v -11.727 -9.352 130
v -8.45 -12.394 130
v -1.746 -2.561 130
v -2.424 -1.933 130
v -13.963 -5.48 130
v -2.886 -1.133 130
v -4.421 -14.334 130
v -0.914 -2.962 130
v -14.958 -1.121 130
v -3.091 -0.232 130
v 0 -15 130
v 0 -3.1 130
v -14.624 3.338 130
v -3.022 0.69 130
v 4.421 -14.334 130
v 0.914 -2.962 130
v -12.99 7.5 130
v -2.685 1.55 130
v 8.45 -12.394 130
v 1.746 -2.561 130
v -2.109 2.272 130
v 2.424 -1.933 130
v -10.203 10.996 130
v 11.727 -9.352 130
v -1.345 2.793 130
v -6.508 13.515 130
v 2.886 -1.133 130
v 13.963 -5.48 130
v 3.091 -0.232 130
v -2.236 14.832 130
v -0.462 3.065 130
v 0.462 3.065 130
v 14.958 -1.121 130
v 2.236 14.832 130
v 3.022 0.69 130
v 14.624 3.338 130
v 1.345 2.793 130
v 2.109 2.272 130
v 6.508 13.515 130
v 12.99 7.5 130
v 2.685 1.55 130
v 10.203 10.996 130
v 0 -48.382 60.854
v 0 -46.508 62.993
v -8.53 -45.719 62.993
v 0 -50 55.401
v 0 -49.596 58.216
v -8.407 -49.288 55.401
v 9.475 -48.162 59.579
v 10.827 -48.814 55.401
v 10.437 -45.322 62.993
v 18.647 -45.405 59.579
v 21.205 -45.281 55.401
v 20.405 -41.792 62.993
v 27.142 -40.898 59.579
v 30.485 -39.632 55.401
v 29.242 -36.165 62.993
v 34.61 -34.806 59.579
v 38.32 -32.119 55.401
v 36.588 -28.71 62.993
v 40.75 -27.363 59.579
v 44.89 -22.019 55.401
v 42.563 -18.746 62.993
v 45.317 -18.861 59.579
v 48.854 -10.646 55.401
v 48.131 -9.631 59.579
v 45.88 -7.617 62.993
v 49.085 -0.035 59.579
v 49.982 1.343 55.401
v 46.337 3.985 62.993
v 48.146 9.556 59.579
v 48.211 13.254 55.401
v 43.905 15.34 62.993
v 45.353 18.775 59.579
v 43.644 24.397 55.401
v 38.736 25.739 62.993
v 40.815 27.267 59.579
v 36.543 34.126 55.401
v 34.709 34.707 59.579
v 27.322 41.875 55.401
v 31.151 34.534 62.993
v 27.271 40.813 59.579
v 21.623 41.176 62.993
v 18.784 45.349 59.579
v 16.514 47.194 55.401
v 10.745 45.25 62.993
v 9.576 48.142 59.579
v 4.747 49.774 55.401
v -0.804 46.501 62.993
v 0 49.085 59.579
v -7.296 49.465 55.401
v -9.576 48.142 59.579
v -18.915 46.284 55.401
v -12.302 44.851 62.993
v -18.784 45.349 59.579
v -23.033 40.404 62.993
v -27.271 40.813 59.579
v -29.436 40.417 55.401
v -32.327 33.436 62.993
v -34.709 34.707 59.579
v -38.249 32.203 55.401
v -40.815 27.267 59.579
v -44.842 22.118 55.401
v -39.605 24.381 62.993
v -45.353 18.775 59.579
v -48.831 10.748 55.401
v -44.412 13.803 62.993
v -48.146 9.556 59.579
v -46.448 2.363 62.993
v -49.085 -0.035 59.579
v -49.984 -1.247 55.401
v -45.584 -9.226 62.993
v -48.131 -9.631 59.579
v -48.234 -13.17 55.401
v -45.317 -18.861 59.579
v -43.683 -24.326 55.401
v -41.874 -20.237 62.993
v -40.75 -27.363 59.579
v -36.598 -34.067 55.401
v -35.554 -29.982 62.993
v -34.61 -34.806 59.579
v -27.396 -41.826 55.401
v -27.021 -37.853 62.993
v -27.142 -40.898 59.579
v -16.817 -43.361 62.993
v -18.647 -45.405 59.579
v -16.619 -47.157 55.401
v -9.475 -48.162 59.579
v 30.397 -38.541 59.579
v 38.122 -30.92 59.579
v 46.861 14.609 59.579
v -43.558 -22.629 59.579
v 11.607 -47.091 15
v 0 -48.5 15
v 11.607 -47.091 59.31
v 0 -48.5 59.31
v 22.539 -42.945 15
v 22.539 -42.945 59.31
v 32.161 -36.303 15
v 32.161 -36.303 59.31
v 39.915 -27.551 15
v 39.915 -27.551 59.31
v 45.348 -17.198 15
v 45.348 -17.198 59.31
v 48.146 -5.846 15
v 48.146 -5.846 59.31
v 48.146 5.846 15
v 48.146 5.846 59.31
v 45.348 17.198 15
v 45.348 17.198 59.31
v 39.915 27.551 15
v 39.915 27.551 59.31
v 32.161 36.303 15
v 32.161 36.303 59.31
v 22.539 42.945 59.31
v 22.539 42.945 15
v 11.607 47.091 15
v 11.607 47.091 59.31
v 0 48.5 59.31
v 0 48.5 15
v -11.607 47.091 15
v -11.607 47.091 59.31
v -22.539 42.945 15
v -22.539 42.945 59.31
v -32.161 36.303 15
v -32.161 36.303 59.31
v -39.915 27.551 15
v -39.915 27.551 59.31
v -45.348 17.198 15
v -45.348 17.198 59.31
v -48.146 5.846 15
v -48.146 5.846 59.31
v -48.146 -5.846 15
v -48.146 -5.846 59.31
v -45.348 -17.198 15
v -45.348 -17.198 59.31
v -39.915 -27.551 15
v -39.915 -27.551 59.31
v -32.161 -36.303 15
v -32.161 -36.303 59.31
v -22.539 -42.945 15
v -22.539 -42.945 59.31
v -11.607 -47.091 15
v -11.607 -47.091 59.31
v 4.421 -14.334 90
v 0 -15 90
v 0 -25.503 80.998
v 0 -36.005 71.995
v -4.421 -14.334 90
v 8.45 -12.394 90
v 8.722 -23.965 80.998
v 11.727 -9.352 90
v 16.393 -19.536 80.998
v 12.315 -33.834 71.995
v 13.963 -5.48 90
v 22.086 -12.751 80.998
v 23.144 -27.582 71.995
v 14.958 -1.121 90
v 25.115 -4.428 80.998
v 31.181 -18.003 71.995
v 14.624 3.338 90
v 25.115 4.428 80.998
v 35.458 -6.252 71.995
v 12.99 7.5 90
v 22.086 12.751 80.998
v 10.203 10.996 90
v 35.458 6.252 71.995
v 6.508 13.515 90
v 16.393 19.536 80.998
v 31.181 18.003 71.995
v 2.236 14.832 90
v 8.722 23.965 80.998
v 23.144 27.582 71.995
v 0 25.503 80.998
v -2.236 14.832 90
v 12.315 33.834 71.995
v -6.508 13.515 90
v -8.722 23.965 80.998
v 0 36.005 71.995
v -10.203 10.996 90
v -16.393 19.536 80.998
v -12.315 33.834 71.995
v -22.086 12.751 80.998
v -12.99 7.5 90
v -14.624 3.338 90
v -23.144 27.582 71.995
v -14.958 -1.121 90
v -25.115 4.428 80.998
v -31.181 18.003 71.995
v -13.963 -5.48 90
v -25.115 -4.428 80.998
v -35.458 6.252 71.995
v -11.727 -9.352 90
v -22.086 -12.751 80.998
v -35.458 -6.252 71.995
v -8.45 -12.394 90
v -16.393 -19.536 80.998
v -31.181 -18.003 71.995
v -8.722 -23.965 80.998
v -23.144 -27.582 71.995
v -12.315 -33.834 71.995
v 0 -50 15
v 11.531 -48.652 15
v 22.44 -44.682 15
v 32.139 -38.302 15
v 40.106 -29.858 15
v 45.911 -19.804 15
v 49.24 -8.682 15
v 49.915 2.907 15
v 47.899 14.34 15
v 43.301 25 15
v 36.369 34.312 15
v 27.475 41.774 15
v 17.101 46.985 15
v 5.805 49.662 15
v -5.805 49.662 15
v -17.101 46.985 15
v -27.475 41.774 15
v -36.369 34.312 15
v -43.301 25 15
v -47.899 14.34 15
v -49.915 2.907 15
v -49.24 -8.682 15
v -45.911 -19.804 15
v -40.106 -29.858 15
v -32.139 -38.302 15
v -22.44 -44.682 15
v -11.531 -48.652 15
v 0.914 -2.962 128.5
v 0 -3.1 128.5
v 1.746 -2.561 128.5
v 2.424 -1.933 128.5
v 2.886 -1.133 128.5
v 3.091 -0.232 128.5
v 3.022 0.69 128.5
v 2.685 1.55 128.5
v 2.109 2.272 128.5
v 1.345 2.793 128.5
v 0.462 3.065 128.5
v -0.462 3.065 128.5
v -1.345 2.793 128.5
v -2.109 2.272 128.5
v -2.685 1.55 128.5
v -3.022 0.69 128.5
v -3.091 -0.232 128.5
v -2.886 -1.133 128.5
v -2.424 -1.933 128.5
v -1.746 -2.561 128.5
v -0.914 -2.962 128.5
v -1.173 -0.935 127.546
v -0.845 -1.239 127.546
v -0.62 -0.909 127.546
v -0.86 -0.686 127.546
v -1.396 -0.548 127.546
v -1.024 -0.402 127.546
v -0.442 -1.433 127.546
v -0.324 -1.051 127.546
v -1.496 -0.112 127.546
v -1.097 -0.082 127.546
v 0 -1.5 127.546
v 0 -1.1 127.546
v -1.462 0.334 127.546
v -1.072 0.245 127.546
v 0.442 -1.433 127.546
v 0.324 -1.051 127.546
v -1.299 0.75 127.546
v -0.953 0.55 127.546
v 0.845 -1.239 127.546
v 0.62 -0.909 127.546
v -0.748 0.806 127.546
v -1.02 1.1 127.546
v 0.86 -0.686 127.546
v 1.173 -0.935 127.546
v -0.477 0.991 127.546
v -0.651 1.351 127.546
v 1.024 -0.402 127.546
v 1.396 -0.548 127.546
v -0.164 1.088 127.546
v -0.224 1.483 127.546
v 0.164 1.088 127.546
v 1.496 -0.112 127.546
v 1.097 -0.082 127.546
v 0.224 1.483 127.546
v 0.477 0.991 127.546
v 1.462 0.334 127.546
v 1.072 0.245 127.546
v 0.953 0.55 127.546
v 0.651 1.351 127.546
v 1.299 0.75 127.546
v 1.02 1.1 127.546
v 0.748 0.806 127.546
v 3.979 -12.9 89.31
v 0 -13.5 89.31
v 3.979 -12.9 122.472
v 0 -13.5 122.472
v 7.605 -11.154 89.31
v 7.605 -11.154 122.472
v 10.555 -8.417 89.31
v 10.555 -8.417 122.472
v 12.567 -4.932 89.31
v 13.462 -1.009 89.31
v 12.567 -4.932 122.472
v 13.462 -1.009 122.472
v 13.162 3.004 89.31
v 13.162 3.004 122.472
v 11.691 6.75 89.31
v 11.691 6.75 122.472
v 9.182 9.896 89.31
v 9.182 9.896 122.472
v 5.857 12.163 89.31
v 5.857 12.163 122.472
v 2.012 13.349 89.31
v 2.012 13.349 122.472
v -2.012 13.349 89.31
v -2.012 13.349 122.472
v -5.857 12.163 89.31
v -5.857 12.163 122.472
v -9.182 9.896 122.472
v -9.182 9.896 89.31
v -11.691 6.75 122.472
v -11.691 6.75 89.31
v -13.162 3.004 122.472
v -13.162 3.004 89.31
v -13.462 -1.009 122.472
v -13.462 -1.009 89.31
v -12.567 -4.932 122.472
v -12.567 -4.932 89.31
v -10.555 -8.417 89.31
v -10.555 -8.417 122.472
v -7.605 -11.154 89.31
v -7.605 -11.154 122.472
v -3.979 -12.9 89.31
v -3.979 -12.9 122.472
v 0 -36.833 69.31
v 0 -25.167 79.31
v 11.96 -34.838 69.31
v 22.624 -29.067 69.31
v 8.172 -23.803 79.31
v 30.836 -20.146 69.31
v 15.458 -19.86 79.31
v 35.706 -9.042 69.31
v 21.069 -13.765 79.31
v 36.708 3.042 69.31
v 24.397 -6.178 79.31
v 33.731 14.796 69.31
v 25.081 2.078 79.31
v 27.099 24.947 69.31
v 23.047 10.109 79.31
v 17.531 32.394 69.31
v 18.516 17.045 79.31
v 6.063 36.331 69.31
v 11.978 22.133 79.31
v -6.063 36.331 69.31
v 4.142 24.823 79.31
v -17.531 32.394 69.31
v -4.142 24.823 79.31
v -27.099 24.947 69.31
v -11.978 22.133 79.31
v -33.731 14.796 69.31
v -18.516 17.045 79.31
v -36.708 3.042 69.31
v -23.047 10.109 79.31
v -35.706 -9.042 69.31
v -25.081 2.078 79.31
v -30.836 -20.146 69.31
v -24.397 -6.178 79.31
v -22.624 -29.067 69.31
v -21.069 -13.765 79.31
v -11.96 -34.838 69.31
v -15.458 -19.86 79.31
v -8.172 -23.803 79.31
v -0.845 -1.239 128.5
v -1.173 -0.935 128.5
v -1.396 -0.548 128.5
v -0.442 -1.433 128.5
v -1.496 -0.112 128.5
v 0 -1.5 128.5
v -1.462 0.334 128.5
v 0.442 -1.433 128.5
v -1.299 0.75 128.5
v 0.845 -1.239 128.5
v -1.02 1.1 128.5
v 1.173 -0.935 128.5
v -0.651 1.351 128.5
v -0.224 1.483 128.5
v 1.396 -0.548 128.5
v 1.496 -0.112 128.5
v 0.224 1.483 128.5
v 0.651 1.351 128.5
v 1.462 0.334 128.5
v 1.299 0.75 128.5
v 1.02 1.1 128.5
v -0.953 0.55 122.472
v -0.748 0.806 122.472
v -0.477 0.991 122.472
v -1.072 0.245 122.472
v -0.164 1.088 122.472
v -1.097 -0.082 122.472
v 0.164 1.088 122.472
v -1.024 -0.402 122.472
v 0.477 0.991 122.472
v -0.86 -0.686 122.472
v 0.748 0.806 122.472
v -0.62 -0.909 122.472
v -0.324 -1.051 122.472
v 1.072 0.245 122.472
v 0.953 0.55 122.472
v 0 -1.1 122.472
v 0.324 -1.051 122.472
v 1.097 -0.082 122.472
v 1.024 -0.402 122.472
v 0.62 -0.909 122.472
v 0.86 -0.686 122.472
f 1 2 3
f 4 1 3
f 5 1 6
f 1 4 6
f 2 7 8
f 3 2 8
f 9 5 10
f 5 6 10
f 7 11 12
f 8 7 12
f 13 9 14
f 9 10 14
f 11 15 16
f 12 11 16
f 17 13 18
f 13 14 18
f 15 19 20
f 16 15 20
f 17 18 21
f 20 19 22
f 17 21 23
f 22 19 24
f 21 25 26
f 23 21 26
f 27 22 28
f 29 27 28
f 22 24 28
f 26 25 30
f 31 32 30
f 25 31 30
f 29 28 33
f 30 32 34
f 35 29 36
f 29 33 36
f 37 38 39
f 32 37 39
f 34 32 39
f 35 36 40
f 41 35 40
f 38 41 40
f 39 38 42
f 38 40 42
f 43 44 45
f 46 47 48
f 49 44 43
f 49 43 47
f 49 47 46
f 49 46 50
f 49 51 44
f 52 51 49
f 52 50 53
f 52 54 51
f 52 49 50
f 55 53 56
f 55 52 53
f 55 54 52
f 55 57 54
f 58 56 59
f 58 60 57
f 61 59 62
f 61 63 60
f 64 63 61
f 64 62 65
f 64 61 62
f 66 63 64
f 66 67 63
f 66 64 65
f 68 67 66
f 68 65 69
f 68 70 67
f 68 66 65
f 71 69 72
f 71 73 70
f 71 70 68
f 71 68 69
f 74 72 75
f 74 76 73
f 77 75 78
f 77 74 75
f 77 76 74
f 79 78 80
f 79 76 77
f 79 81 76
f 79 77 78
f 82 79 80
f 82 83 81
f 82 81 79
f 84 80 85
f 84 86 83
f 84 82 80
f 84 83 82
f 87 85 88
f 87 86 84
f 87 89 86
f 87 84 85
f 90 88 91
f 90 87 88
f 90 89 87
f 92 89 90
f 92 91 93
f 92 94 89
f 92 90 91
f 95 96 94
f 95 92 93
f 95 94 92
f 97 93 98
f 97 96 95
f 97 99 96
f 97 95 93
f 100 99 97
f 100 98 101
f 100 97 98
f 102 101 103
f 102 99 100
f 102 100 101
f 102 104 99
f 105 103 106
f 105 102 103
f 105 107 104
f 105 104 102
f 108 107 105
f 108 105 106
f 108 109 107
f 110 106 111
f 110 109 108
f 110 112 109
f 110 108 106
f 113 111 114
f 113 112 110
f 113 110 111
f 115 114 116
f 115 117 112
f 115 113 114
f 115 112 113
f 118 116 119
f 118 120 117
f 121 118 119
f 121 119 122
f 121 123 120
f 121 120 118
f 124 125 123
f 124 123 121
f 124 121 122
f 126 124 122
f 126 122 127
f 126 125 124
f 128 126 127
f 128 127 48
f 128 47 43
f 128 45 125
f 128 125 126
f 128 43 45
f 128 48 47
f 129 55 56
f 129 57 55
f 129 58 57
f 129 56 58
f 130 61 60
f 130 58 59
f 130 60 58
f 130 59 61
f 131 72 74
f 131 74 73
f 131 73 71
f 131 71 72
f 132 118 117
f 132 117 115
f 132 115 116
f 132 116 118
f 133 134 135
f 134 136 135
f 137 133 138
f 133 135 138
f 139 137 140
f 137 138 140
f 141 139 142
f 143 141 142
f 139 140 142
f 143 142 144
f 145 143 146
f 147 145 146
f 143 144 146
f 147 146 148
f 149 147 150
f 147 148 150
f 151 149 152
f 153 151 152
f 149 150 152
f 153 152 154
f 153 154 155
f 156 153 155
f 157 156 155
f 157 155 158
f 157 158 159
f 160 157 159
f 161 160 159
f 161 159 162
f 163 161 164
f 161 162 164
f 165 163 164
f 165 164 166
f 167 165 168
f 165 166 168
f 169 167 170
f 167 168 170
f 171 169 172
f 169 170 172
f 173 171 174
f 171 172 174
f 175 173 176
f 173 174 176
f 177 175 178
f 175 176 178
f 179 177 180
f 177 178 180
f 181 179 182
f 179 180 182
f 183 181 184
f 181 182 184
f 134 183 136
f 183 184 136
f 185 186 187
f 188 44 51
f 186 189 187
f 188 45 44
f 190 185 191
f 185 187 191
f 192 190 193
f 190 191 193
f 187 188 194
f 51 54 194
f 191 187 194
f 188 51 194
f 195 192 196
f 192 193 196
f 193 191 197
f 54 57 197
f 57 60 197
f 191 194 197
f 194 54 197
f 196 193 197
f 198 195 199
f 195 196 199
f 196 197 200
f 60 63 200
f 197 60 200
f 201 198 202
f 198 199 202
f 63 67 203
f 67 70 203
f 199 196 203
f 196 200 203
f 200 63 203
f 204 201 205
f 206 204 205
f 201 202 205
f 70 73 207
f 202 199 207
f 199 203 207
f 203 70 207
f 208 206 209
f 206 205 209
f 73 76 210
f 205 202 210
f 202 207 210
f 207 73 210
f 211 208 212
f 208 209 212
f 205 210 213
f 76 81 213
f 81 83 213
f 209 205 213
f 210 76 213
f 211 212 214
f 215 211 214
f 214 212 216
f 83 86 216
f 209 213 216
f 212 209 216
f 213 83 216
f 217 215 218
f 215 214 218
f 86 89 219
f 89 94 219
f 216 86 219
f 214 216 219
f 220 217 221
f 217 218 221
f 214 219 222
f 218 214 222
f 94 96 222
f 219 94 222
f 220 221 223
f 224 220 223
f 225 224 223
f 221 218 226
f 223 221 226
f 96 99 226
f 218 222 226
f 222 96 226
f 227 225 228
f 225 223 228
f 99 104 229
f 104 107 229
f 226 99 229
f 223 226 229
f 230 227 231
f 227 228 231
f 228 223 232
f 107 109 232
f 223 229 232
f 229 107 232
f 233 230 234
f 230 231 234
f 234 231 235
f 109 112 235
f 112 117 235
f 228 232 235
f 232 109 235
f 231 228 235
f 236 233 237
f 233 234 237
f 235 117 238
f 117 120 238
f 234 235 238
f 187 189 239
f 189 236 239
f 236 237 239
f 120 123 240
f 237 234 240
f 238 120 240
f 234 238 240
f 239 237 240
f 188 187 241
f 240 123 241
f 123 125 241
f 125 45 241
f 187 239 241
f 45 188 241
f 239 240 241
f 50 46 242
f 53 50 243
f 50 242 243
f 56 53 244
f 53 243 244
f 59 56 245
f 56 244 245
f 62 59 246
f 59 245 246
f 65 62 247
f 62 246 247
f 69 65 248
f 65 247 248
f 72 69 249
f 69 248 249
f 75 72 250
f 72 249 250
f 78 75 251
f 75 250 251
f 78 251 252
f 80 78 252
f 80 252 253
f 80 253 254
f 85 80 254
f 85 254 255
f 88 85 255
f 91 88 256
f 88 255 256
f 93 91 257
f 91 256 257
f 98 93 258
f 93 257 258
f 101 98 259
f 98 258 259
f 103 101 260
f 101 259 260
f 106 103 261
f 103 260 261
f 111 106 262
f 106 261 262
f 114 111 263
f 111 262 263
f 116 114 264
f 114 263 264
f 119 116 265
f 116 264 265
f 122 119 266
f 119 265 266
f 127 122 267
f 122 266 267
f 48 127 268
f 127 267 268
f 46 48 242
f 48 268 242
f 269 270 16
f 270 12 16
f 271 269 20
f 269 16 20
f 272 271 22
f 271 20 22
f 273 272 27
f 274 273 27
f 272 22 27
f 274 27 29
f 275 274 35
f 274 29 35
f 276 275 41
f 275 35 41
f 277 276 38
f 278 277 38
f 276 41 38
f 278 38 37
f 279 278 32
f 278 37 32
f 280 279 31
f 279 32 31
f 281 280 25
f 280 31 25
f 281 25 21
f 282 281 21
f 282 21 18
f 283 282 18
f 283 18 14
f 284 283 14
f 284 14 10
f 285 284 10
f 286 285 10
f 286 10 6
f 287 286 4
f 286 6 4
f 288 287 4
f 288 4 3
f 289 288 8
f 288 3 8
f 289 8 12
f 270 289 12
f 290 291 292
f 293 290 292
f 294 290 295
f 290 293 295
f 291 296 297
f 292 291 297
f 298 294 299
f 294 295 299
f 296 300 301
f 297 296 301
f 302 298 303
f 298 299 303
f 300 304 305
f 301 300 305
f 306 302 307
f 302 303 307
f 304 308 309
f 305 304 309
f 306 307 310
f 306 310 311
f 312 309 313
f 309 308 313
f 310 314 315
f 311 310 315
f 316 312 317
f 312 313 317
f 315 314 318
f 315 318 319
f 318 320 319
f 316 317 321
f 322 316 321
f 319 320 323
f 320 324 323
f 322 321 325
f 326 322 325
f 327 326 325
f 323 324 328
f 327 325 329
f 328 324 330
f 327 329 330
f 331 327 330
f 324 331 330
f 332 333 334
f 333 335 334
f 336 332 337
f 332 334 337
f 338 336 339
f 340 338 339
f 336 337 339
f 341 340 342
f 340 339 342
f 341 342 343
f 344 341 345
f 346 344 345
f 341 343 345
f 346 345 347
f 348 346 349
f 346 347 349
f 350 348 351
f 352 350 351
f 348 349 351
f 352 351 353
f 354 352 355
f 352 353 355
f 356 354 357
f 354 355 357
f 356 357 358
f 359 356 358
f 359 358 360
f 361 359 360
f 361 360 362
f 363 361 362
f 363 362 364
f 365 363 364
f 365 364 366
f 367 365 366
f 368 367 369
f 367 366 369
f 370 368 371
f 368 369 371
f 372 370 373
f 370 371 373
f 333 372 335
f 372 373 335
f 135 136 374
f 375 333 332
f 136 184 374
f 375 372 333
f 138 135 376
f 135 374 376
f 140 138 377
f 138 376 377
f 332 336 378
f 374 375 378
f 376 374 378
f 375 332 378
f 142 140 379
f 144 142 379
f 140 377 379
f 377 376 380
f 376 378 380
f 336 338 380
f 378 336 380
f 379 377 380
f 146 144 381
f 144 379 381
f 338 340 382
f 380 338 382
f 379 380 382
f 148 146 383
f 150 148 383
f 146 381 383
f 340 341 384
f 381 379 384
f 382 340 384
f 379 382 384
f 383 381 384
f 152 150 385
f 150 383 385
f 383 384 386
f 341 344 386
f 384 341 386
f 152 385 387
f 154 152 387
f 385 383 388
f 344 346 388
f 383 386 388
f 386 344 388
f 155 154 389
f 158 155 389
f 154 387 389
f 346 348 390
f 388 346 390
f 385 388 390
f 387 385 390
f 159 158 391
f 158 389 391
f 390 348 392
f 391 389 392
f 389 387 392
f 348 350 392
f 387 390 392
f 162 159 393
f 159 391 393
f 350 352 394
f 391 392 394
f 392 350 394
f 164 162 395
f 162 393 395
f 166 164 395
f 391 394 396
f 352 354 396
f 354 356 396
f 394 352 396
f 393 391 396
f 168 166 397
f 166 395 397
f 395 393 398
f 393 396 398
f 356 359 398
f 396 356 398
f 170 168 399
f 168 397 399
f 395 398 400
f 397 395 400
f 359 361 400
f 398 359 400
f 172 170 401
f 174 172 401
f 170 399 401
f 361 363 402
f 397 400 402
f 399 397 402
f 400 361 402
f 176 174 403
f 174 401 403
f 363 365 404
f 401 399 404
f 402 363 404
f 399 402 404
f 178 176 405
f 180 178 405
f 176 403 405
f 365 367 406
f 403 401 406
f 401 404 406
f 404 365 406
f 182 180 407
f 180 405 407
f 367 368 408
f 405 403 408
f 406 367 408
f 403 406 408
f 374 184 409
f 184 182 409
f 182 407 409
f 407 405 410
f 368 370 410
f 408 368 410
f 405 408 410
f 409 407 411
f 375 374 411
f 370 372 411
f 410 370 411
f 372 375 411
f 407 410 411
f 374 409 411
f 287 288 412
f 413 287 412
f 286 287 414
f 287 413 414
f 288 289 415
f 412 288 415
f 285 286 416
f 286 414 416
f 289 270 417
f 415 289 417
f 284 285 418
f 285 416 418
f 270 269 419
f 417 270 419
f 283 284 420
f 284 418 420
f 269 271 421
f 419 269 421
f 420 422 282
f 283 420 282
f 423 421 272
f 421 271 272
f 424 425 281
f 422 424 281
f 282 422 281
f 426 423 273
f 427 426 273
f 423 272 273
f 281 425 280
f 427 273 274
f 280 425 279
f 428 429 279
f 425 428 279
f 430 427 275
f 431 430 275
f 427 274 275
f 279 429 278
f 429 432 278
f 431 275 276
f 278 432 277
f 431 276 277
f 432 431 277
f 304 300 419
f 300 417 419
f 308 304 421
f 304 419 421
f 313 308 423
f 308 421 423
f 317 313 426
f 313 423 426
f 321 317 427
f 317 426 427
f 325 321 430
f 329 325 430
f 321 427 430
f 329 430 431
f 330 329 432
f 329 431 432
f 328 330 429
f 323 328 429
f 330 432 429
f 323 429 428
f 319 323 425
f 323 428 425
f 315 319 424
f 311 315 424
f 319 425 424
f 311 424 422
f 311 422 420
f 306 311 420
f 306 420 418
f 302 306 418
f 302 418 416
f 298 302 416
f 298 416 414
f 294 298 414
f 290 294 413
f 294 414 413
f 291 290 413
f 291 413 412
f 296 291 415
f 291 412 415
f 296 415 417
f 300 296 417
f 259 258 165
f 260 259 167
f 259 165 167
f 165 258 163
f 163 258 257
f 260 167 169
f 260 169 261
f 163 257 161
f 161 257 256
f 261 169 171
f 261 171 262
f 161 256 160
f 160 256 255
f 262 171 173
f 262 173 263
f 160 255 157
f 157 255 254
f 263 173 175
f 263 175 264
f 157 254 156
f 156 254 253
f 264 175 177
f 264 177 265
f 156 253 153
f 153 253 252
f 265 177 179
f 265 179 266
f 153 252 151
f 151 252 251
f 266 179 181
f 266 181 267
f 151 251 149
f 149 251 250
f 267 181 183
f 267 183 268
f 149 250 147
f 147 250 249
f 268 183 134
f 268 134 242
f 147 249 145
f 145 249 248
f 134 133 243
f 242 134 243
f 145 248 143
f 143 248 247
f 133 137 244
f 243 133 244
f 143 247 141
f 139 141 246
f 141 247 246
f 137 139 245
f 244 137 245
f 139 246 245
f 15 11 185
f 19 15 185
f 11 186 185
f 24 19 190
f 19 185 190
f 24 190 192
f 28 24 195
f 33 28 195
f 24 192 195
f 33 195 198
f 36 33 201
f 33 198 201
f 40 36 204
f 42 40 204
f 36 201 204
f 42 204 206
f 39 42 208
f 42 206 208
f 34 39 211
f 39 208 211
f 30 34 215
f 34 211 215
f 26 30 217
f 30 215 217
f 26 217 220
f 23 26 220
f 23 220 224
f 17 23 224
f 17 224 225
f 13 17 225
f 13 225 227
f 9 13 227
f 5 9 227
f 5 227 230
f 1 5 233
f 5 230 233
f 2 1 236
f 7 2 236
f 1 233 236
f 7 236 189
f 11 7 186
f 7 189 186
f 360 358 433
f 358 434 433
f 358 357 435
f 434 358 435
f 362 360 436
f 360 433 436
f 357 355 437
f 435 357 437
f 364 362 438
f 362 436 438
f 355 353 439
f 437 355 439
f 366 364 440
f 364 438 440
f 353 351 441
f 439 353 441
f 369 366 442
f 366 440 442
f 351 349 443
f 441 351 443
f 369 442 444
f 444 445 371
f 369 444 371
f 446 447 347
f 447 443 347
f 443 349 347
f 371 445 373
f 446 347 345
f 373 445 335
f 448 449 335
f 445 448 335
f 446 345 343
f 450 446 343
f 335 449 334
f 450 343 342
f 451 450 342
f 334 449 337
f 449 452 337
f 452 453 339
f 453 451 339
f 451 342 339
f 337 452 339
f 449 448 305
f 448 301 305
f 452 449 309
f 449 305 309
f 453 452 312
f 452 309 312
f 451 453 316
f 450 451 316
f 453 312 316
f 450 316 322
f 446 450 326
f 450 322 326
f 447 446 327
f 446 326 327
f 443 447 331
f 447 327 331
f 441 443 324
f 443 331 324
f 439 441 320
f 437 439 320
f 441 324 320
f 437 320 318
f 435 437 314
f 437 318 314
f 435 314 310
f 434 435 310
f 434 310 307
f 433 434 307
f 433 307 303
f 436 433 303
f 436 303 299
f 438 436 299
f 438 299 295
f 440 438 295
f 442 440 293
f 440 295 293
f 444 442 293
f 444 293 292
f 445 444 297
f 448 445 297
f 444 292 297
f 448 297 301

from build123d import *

# Parameters (mm, degrees)
F2_R = 10


with BuildPart() as f1:
    # F0 (on Right) → F1 (revolve)
    with BuildSketch(Plane.YZ):
        Polygon((-50, 15), (-48.5, 15), (-48.5, 59.310098), (-13.5, 89.310098), (-13.5, 122.471504), (-1.1, 122.471504), (-1.1, 127.54637), (-1.5, 127.54637), (-1.5, 128.5), (-3.1, 128.5), (-3.1, 130), (-15, 130), (-15, 90), (-50, 60), align=None)
    revolve(axis=Axis((0, 0, 8.976309), (0, 0, 1)))

    # F2
    f2_edges = [f1.edges().sort_by_distance(p)[0] for p in [
        (0, 50, 60),
    ]]
    fillet(f2_edges, radius=F2_R)


solid = f1.part
